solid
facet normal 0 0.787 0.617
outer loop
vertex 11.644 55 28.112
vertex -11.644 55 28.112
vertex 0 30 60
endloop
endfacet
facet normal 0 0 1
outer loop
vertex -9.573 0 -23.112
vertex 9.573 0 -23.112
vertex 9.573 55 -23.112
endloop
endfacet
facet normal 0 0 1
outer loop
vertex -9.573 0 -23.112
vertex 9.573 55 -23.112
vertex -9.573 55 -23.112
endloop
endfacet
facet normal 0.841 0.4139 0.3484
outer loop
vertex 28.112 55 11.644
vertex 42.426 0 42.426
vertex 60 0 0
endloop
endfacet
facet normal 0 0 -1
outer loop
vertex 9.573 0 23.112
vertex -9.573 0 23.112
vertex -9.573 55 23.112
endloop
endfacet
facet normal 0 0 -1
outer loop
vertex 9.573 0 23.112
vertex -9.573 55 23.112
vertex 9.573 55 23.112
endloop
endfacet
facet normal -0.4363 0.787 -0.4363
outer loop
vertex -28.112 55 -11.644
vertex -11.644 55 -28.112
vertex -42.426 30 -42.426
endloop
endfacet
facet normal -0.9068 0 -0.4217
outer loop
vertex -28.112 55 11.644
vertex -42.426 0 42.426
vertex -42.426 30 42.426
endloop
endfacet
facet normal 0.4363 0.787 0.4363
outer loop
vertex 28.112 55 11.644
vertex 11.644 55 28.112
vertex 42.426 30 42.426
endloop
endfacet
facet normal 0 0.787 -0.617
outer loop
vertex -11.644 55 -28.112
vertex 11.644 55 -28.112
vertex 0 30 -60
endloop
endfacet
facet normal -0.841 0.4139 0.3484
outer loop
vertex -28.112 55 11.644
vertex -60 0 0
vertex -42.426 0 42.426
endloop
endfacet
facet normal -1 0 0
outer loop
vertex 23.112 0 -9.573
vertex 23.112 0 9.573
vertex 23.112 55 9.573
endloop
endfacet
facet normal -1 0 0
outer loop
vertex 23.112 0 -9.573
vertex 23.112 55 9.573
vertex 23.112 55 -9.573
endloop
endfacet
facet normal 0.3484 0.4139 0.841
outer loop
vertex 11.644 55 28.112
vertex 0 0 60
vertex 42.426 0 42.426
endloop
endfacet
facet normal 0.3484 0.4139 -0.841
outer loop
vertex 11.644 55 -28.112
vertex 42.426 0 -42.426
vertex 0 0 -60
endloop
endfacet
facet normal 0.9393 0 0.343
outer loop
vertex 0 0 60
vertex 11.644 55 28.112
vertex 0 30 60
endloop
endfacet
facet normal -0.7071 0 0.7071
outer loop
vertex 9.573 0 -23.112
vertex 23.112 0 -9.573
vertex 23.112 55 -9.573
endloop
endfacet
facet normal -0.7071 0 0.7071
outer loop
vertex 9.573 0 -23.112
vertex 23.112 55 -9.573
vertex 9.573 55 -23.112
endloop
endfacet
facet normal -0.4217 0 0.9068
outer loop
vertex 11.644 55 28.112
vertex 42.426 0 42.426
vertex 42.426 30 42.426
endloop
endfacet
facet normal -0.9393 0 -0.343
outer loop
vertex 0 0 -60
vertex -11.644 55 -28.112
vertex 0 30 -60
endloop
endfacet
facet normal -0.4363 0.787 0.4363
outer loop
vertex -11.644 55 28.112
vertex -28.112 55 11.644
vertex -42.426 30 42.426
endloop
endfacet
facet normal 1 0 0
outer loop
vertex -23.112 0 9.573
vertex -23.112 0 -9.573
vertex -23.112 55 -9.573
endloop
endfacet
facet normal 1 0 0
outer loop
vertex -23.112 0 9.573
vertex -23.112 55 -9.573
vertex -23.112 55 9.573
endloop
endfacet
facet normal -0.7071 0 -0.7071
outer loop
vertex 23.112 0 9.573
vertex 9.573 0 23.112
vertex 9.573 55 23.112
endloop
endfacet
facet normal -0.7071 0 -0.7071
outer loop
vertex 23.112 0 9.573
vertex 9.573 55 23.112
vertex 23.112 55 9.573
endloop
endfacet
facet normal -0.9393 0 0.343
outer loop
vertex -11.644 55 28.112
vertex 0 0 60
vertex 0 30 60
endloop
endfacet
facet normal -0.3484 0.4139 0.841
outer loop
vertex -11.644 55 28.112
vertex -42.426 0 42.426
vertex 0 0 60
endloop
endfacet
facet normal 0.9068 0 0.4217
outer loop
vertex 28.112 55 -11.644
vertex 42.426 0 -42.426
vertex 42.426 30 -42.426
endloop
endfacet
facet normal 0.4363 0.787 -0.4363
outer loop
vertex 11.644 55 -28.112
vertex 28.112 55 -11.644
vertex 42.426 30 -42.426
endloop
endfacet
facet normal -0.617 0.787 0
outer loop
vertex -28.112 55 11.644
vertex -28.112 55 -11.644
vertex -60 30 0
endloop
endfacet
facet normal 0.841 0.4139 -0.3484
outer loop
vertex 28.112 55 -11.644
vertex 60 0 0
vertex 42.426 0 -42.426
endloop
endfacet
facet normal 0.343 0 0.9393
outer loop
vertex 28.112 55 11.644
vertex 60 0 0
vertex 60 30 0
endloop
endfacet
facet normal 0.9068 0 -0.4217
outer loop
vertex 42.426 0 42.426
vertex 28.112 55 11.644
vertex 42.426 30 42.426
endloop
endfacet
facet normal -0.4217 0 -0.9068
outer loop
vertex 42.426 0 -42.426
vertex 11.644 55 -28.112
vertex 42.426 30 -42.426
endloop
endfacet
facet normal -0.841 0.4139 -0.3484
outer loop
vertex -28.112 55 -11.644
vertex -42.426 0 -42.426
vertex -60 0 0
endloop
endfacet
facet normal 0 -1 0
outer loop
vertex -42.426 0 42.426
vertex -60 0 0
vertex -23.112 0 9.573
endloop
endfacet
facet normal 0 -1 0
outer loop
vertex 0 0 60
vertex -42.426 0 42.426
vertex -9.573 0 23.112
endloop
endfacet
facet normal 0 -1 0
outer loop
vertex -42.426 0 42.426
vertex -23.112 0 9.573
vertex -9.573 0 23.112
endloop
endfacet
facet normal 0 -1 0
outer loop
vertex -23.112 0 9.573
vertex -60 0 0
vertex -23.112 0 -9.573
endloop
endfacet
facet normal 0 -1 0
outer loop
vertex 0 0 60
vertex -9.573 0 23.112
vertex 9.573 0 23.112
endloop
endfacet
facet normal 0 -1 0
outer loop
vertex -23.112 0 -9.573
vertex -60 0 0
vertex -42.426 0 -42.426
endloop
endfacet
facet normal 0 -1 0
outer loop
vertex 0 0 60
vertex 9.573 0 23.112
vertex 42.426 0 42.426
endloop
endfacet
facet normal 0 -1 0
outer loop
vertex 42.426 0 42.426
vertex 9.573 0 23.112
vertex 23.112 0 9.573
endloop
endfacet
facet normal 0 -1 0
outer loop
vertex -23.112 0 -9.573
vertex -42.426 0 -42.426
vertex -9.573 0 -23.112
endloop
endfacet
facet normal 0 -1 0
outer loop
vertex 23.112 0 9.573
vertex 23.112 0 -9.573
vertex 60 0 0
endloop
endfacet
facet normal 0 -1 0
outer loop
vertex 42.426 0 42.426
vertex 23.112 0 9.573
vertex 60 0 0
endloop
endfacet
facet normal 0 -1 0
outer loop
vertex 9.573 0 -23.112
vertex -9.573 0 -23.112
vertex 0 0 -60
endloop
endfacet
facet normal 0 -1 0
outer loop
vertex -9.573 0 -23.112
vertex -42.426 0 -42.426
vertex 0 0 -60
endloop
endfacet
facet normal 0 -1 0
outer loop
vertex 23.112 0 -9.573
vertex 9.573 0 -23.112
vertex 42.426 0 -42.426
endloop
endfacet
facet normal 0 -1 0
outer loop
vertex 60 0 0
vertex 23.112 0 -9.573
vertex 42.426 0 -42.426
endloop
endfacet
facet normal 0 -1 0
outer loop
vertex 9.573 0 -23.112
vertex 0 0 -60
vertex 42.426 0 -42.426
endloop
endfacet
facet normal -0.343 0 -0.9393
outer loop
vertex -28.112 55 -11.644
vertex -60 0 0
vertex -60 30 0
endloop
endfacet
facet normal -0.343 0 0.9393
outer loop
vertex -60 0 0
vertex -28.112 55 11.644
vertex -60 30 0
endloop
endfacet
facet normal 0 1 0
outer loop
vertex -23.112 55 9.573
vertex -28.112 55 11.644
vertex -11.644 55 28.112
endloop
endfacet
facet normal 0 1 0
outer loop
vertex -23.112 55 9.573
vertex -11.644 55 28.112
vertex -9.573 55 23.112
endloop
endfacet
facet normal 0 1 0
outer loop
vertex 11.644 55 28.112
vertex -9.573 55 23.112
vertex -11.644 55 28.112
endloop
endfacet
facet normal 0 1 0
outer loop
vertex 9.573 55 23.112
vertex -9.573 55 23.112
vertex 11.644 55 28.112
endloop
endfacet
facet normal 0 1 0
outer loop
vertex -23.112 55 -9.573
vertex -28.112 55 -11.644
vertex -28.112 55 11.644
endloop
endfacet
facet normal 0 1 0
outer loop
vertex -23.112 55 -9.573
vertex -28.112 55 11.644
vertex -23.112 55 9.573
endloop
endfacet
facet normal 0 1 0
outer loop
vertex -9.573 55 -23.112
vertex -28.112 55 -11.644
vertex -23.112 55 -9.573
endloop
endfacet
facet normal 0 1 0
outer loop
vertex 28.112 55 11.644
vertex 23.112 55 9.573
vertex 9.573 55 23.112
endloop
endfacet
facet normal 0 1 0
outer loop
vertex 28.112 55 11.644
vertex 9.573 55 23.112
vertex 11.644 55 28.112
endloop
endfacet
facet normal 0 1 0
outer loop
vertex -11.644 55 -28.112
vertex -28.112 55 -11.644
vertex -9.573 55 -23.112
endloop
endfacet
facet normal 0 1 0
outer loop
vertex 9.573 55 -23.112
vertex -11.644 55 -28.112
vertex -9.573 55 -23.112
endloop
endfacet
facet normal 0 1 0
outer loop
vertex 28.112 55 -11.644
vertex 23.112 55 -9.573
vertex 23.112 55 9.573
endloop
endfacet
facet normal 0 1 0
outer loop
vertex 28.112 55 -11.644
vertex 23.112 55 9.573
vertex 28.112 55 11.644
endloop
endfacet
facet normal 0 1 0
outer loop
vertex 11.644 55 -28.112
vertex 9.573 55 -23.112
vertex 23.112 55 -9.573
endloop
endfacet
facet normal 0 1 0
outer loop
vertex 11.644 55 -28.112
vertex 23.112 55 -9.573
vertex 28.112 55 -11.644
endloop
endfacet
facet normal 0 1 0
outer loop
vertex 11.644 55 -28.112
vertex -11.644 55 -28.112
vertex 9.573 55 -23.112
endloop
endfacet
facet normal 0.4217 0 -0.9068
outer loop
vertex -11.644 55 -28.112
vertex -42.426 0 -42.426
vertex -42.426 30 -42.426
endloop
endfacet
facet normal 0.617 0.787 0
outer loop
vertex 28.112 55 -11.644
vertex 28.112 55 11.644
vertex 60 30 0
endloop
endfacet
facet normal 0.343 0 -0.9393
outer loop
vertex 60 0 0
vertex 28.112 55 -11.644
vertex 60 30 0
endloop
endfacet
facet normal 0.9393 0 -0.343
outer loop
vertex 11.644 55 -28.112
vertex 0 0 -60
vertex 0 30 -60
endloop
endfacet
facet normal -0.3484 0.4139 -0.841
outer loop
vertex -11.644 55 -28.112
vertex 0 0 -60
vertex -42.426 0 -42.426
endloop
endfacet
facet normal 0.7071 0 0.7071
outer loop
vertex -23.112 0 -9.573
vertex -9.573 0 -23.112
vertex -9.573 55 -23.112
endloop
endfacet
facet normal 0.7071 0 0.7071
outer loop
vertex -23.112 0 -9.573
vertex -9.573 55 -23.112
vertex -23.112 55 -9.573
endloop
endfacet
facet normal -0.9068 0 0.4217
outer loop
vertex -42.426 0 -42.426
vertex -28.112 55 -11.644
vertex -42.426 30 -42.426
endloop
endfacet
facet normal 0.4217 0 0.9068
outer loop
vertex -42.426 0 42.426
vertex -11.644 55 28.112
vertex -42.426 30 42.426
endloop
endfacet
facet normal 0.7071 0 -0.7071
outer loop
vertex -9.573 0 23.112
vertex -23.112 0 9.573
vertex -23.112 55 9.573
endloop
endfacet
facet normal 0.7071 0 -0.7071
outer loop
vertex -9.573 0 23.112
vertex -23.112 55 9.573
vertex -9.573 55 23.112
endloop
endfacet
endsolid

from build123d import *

# Parameters (mm, degrees)
EXTRUDE_1_DEPTH          = 55
CUT_EXTRUDE_3_DEPTH      = 323.664416923
PATTERN_CIRCULAR_1_COUNT = 8
CUT_EXTRUDE_4_DEPTH      = 158.777475037
PATTERN_CIRCULAR_2_COUNT = 8


with BuildPart() as part:
    # 草图1 → 凸台-拉伸1 (new body)
    with BuildSketch(Plane(origin=(0, 0, 0), x_dir=(1, 0, 0), z_dir=(0, 1, 0))):
        Polygon((42.426406871, -42.426406871), (60, 0), (42.426406871, 42.426406871), (0, 60), (-42.426406871, 42.426406871), (-60, 0), (-42.426406871, -42.426406871), (0, -60), align=None)
        Polygon((23.111992498, -9.573300746), (23.111992498, 9.573300746), (9.573300746, 23.111992498), (-9.573300746, 23.111992498), (-23.111992498, 9.573300746), (-23.111992498, -9.573300746), (-9.573300746, -23.111992498), (9.573300746, -23.111992498), align=None, mode=Mode.SUBTRACT)
    extrude(amount=EXTRUDE_1_DEPTH)

    # 草图4 → 切除-拉伸3 (cut, through all, along a direction that is not the sketch's normal)
    with BuildSketch(Plane(origin=(-17.57970482, 20.884718614, 42.441161798), x_dir=(0.9373566365157255, 0.153814342715155, 0.31257588511436873), z_dir=(-0.34837126170211885, 0.4138656392921341, 0.8410426247422821))):
        Polygon((6.331993641, 36.93658877), (-26.507202364, -18.732285364), (18.754553107, -26.491452015), align=None)
    cut_extrude_3 = extrude(amount=CUT_EXTRUDE_3_DEPTH, dir=(0, 1, 0), mode=Mode.SUBTRACT)

    # 阵列(圆周)1: 切除-拉伸3 ×8 about axis
    pattern_circular_1_axis = Axis((0, 55, 0), (0, -1, 0))
    for i in range(1, PATTERN_CIRCULAR_1_COUNT):
        add(cut_extrude_3.rotate(pattern_circular_1_axis, i * 360 / PATTERN_CIRCULAR_1_COUNT), mode=Mode.SUBTRACT)

    # 草图8 → 切除-拉伸4 (cut, through all, along a direction that is not the sketch's normal)
    with BuildSketch(Plane(origin=(-37.406700868, 47.713006316, 0), x_dir=(-0.7869756649359425, -0.616984037717858, 0), z_dir=(0.616984037717858, -0.7869756649359426, 0))):
        Polygon((-11.810668086, 11.644368558), (-11.810668086, -11.644368558), (28.709826154, 0), align=None)
    cut_extrude_4 = extrude(amount=-CUT_EXTRUDE_4_DEPTH, dir=(0, -1, 0), mode=Mode.SUBTRACT)

    # 阵列(圆周)2: 切除-拉伸4 ×8 about axis
    pattern_circular_2_axis = Axis((0, 55, 0), (0, -1, 0))
    for i in range(1, PATTERN_CIRCULAR_2_COUNT):
        add(cut_extrude_4.rotate(pattern_circular_2_axis, i * 360 / PATTERN_CIRCULAR_2_COUNT), mode=Mode.SUBTRACT)


solid = part.part
